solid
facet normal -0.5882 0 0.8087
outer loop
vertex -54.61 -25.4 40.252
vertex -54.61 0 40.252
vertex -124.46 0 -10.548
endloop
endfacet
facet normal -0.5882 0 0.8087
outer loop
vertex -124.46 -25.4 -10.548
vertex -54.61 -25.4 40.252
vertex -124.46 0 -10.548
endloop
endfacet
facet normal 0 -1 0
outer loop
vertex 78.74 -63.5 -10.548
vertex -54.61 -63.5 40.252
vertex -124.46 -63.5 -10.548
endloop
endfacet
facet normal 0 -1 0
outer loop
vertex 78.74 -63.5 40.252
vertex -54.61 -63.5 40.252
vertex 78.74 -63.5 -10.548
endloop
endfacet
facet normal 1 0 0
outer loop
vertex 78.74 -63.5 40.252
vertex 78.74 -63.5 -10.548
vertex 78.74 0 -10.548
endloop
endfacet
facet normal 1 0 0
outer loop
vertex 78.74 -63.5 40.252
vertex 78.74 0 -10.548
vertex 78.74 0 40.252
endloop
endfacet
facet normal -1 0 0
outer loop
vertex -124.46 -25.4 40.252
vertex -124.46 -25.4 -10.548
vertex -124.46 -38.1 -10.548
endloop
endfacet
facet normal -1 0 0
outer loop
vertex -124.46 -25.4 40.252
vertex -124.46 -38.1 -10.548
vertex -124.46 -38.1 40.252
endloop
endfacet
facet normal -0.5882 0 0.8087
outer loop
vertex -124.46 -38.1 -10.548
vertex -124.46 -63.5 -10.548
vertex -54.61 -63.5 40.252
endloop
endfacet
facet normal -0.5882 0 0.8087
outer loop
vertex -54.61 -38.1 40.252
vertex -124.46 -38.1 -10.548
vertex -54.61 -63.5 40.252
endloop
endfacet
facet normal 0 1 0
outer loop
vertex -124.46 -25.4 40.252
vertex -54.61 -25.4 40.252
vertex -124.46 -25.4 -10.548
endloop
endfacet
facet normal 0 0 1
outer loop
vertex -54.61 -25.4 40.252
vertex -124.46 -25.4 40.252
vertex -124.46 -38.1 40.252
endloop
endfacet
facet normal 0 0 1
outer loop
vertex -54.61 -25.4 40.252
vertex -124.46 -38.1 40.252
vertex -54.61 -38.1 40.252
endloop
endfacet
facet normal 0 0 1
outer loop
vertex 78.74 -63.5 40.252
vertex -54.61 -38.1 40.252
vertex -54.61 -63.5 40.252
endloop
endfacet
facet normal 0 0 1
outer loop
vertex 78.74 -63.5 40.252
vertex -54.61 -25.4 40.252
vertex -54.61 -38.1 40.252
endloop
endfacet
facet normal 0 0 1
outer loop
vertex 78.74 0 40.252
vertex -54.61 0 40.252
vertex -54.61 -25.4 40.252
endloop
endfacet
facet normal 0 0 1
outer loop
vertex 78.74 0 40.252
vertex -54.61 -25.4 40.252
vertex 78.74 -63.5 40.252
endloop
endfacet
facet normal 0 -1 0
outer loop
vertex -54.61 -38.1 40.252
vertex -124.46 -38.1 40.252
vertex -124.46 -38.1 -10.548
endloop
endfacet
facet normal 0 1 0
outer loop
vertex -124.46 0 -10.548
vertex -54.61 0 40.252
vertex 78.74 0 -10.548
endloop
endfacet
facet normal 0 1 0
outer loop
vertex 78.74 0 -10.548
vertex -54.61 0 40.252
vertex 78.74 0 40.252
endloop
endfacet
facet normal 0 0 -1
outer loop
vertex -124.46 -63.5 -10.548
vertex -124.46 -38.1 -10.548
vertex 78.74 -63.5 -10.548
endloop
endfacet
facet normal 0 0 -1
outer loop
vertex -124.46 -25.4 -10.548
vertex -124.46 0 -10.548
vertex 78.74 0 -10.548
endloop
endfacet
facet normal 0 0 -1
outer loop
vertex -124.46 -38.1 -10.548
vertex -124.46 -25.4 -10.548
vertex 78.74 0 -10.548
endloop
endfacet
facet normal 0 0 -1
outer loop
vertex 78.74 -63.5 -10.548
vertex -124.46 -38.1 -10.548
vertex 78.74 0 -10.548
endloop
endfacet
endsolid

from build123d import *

# Parameters (mm, degrees)
F0_W     = 203.2
F0_H     = 50.8
F1_DEPTH = 63.5
F3_DEPTH = 25.4
F5_DEPTH = 25.4


with BuildPart() as f1:
    # F0 (on Front) → F1 (new body)
    with BuildSketch(Plane.XZ):
        with Locations((-22.86, 14.851971)):
            Rectangle(F0_W, F0_H)
    extrude(amount=F1_DEPTH)

    # F2 (on face) → F3 (cut)
    with BuildSketch(Plane.XZ.offset(63.5)):
        Polygon((-124.46, 40.251971), (-124.46, -10.548029), (-54.61, 40.251971), align=None)
    extrude(amount=-F3_DEPTH, mode=Mode.SUBTRACT)

    # F4 (on face) → F5 (cut)
    with BuildSketch(Plane(origin=(0, 0, 0), x_dir=(-1, 0, 0), z_dir=(0, 1, 0))):
        Polygon((54.61, 40.251971), (124.46, -10.548029), (124.46, 40.251971), align=None)
    extrude(amount=-F5_DEPTH, mode=Mode.SUBTRACT)


solid = f1.part
